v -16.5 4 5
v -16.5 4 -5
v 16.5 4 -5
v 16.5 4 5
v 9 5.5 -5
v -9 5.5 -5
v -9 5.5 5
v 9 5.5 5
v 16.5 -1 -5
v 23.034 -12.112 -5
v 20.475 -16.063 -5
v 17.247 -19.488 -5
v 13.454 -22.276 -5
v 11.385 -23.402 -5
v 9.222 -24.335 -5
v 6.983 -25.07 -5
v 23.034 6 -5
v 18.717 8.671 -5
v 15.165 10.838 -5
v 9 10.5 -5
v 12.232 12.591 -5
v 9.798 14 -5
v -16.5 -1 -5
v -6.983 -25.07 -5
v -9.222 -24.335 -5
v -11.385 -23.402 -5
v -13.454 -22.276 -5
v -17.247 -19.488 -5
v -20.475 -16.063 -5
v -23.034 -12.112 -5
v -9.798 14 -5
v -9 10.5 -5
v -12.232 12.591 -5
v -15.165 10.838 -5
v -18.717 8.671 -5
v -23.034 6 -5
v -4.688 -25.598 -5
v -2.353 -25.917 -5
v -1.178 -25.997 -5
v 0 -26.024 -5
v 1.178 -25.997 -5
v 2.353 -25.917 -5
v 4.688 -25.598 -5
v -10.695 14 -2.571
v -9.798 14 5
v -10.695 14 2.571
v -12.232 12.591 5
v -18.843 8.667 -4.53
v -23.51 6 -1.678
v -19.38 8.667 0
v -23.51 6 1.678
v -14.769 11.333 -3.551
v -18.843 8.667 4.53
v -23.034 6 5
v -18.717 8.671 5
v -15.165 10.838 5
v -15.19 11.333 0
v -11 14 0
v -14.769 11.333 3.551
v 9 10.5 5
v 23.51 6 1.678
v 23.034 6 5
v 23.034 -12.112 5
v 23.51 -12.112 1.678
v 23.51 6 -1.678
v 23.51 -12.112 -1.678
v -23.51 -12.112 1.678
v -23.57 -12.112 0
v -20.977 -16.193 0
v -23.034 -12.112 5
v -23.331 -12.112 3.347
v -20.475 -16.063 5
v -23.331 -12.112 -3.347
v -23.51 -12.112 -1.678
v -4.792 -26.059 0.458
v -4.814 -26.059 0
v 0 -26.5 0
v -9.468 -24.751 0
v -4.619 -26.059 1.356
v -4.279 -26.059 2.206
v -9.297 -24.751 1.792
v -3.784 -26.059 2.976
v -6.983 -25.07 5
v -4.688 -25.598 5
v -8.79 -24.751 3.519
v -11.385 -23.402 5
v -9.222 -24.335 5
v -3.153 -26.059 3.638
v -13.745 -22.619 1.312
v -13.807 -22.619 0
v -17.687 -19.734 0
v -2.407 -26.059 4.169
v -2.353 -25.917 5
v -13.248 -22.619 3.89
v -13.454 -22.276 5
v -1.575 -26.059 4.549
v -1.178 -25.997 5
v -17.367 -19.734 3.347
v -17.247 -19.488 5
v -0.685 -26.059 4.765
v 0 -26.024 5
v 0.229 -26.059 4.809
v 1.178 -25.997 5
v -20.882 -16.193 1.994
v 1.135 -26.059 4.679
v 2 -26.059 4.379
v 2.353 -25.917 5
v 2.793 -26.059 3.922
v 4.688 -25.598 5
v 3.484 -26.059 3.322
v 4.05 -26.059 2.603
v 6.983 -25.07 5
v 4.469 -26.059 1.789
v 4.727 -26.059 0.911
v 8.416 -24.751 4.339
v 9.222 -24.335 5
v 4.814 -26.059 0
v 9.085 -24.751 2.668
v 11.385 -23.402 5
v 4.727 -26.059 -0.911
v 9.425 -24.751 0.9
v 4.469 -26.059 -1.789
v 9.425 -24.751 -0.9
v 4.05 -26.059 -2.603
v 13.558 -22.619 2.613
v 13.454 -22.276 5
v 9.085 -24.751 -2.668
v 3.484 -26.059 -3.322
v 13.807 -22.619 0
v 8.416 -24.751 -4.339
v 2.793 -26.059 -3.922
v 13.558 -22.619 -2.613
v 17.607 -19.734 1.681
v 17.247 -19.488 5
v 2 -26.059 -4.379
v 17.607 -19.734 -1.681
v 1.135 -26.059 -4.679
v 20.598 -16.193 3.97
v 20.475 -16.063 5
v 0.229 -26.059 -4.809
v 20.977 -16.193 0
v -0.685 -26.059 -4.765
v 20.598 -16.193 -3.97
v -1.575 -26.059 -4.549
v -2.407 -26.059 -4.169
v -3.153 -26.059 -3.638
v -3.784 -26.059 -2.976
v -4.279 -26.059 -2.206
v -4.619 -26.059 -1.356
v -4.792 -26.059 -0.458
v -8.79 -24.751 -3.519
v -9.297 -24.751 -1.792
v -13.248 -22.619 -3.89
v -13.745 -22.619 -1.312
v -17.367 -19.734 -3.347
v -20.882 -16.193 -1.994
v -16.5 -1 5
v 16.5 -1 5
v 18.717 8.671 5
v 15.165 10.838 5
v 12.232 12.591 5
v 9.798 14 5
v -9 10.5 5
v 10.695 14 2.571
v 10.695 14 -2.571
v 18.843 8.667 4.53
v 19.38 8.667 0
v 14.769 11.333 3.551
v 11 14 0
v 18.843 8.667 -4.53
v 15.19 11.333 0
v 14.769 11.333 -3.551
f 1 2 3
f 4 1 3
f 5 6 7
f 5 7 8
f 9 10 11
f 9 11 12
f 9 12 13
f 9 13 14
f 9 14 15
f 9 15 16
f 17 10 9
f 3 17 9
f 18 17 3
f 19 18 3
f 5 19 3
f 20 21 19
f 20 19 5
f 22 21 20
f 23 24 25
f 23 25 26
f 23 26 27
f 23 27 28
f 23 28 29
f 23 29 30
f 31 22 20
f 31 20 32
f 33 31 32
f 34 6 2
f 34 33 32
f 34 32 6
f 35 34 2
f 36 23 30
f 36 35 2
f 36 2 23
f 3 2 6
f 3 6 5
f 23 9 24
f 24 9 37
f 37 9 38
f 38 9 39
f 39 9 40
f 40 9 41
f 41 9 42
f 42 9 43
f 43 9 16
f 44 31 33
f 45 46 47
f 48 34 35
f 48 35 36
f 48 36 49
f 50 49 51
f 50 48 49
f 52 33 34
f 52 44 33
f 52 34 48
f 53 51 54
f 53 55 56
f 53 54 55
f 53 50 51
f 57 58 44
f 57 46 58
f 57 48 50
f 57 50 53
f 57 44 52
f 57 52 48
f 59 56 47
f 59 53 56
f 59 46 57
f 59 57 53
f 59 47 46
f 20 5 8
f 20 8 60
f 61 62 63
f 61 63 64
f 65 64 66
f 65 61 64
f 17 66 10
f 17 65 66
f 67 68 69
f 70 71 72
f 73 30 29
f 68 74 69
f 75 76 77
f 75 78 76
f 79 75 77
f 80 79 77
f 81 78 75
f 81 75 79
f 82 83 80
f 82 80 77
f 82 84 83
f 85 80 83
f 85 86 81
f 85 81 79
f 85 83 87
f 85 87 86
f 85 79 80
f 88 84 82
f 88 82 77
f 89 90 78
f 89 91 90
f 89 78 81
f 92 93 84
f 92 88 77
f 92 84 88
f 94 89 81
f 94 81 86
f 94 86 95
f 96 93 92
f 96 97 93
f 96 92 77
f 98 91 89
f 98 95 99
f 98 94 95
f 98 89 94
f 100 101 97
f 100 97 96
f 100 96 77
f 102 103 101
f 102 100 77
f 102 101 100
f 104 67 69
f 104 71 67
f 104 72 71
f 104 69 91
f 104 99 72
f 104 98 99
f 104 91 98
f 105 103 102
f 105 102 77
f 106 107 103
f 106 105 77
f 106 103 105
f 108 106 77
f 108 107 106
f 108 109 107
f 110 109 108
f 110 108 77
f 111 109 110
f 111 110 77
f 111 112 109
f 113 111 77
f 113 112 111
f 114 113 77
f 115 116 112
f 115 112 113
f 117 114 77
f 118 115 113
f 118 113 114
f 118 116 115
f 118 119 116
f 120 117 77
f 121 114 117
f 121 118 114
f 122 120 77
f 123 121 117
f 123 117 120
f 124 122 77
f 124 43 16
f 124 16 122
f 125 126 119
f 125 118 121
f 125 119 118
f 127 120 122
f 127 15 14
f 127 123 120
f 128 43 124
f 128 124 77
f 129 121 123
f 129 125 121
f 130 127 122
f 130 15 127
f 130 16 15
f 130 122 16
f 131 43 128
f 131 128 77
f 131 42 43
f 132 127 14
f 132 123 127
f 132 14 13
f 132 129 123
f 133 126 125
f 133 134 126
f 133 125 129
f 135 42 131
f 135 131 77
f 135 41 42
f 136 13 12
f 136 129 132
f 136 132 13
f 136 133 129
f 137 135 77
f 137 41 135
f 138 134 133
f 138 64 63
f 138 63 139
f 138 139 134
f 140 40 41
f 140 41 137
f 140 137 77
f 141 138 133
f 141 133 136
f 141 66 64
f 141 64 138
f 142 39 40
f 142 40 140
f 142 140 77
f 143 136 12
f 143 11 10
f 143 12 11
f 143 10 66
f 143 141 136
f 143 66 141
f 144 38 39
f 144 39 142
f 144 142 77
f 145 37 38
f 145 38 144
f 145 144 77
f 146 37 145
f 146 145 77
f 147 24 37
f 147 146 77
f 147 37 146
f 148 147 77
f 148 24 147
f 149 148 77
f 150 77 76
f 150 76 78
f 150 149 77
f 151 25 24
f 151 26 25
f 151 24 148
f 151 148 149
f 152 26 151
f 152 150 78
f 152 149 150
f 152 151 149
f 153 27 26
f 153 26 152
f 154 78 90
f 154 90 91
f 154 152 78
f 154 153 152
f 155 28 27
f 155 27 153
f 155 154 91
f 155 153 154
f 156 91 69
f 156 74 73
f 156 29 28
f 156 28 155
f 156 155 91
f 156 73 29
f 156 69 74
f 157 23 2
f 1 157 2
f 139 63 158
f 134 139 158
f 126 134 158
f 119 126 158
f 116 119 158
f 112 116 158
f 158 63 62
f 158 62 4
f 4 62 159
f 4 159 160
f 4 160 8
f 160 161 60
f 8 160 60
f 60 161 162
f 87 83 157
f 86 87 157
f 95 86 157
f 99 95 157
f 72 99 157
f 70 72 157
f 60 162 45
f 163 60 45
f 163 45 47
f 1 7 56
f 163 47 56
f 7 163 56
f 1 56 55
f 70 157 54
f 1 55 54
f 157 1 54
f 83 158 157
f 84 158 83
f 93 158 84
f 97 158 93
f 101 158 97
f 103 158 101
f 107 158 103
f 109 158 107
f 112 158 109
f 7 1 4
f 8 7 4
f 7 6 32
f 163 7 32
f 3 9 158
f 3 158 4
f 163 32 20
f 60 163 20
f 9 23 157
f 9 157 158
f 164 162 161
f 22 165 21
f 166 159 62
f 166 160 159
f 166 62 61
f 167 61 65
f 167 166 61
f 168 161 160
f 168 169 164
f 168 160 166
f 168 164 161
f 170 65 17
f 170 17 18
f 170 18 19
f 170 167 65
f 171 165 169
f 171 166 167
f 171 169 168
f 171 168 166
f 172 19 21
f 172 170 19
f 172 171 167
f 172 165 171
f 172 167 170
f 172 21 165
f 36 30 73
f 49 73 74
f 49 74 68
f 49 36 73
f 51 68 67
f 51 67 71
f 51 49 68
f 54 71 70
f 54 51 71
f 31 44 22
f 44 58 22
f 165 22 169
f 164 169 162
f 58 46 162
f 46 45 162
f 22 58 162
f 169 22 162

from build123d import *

# Parameters (mm, degrees)
BOSS_EXTRUDE2_DEPTH     = 5
SKETCH2_W               = 18
SKETCH2_H               = 5
SKETCH2_W_2             = 33
CUT_EXTRUDE1_DEPTH      = 6
CUT_EXTRUDE1_DEPTH_BACK = 6


with BuildPart() as part:
    # Sketch1 → Boss-Extrude2 (new body, symmetric)
    with BuildSketch(Plane.XY):
        with BuildLine():
            Line((-23.57, 6), (-23.57, -12.112188076))
            ThreePointArc((-23.57, -12.112188076), (-13.807190445, -22.618830474), (0, -26.5))
            Line((0, -26.5), (0, 14))
            Line((0, 14), (-11, 14))
            Line((-11, 14), (-23.57, 6))
        make_face()
    boss_extrude2 = extrude(amount=BOSS_EXTRUDE2_DEPTH, both=True)

    # Mirror2: Boss-Extrude2 across plane
    add(boss_extrude2.mirror(Plane(origin=(0, 0, 0), x_dir=(0, 0, 1), z_dir=(1, 0, 0))))

    # Sketch1<6> → Cut-Revolve2 (revolve, cut)
    with BuildSketch(Plane.XY):
        with BuildLine():
            ThreePointArc((0, -26.5), (-13.807190445, -22.618830474), (-23.57, -12.112188076))
            Line((-23.57, -12.112188076), (-23.57, 6))
            Line((-23.57, 6), (-11, 14))
            Line((-11, 14), (0, 14))
            Line((0, 14), (0, 39.736431601))
            ThreePointArc((0, 39.736431601), (-39.736431601, 0), (0, -39.736431601))
            Line((0, -39.736431601), (0, -26.5))
        make_face()
    revolve(axis=Axis((0, 0, 0), (0, 1, 0)), mode=Mode.SUBTRACT)

    # Sketch2 → Cut-Extrude1 (cut, two sides)
    with BuildSketch(Plane.XY) as cut_extrude1_sk:
        with Locations((0, 8)):
            Rectangle(SKETCH2_W, SKETCH2_H)
        with Locations((0, 1.5)):
            Rectangle(SKETCH2_W_2, SKETCH2_H)
    extrude(amount=CUT_EXTRUDE1_DEPTH, mode=Mode.SUBTRACT)
    extrude(cut_extrude1_sk.sketch, amount=-CUT_EXTRUDE1_DEPTH_BACK, mode=Mode.SUBTRACT)


solid = part.part
